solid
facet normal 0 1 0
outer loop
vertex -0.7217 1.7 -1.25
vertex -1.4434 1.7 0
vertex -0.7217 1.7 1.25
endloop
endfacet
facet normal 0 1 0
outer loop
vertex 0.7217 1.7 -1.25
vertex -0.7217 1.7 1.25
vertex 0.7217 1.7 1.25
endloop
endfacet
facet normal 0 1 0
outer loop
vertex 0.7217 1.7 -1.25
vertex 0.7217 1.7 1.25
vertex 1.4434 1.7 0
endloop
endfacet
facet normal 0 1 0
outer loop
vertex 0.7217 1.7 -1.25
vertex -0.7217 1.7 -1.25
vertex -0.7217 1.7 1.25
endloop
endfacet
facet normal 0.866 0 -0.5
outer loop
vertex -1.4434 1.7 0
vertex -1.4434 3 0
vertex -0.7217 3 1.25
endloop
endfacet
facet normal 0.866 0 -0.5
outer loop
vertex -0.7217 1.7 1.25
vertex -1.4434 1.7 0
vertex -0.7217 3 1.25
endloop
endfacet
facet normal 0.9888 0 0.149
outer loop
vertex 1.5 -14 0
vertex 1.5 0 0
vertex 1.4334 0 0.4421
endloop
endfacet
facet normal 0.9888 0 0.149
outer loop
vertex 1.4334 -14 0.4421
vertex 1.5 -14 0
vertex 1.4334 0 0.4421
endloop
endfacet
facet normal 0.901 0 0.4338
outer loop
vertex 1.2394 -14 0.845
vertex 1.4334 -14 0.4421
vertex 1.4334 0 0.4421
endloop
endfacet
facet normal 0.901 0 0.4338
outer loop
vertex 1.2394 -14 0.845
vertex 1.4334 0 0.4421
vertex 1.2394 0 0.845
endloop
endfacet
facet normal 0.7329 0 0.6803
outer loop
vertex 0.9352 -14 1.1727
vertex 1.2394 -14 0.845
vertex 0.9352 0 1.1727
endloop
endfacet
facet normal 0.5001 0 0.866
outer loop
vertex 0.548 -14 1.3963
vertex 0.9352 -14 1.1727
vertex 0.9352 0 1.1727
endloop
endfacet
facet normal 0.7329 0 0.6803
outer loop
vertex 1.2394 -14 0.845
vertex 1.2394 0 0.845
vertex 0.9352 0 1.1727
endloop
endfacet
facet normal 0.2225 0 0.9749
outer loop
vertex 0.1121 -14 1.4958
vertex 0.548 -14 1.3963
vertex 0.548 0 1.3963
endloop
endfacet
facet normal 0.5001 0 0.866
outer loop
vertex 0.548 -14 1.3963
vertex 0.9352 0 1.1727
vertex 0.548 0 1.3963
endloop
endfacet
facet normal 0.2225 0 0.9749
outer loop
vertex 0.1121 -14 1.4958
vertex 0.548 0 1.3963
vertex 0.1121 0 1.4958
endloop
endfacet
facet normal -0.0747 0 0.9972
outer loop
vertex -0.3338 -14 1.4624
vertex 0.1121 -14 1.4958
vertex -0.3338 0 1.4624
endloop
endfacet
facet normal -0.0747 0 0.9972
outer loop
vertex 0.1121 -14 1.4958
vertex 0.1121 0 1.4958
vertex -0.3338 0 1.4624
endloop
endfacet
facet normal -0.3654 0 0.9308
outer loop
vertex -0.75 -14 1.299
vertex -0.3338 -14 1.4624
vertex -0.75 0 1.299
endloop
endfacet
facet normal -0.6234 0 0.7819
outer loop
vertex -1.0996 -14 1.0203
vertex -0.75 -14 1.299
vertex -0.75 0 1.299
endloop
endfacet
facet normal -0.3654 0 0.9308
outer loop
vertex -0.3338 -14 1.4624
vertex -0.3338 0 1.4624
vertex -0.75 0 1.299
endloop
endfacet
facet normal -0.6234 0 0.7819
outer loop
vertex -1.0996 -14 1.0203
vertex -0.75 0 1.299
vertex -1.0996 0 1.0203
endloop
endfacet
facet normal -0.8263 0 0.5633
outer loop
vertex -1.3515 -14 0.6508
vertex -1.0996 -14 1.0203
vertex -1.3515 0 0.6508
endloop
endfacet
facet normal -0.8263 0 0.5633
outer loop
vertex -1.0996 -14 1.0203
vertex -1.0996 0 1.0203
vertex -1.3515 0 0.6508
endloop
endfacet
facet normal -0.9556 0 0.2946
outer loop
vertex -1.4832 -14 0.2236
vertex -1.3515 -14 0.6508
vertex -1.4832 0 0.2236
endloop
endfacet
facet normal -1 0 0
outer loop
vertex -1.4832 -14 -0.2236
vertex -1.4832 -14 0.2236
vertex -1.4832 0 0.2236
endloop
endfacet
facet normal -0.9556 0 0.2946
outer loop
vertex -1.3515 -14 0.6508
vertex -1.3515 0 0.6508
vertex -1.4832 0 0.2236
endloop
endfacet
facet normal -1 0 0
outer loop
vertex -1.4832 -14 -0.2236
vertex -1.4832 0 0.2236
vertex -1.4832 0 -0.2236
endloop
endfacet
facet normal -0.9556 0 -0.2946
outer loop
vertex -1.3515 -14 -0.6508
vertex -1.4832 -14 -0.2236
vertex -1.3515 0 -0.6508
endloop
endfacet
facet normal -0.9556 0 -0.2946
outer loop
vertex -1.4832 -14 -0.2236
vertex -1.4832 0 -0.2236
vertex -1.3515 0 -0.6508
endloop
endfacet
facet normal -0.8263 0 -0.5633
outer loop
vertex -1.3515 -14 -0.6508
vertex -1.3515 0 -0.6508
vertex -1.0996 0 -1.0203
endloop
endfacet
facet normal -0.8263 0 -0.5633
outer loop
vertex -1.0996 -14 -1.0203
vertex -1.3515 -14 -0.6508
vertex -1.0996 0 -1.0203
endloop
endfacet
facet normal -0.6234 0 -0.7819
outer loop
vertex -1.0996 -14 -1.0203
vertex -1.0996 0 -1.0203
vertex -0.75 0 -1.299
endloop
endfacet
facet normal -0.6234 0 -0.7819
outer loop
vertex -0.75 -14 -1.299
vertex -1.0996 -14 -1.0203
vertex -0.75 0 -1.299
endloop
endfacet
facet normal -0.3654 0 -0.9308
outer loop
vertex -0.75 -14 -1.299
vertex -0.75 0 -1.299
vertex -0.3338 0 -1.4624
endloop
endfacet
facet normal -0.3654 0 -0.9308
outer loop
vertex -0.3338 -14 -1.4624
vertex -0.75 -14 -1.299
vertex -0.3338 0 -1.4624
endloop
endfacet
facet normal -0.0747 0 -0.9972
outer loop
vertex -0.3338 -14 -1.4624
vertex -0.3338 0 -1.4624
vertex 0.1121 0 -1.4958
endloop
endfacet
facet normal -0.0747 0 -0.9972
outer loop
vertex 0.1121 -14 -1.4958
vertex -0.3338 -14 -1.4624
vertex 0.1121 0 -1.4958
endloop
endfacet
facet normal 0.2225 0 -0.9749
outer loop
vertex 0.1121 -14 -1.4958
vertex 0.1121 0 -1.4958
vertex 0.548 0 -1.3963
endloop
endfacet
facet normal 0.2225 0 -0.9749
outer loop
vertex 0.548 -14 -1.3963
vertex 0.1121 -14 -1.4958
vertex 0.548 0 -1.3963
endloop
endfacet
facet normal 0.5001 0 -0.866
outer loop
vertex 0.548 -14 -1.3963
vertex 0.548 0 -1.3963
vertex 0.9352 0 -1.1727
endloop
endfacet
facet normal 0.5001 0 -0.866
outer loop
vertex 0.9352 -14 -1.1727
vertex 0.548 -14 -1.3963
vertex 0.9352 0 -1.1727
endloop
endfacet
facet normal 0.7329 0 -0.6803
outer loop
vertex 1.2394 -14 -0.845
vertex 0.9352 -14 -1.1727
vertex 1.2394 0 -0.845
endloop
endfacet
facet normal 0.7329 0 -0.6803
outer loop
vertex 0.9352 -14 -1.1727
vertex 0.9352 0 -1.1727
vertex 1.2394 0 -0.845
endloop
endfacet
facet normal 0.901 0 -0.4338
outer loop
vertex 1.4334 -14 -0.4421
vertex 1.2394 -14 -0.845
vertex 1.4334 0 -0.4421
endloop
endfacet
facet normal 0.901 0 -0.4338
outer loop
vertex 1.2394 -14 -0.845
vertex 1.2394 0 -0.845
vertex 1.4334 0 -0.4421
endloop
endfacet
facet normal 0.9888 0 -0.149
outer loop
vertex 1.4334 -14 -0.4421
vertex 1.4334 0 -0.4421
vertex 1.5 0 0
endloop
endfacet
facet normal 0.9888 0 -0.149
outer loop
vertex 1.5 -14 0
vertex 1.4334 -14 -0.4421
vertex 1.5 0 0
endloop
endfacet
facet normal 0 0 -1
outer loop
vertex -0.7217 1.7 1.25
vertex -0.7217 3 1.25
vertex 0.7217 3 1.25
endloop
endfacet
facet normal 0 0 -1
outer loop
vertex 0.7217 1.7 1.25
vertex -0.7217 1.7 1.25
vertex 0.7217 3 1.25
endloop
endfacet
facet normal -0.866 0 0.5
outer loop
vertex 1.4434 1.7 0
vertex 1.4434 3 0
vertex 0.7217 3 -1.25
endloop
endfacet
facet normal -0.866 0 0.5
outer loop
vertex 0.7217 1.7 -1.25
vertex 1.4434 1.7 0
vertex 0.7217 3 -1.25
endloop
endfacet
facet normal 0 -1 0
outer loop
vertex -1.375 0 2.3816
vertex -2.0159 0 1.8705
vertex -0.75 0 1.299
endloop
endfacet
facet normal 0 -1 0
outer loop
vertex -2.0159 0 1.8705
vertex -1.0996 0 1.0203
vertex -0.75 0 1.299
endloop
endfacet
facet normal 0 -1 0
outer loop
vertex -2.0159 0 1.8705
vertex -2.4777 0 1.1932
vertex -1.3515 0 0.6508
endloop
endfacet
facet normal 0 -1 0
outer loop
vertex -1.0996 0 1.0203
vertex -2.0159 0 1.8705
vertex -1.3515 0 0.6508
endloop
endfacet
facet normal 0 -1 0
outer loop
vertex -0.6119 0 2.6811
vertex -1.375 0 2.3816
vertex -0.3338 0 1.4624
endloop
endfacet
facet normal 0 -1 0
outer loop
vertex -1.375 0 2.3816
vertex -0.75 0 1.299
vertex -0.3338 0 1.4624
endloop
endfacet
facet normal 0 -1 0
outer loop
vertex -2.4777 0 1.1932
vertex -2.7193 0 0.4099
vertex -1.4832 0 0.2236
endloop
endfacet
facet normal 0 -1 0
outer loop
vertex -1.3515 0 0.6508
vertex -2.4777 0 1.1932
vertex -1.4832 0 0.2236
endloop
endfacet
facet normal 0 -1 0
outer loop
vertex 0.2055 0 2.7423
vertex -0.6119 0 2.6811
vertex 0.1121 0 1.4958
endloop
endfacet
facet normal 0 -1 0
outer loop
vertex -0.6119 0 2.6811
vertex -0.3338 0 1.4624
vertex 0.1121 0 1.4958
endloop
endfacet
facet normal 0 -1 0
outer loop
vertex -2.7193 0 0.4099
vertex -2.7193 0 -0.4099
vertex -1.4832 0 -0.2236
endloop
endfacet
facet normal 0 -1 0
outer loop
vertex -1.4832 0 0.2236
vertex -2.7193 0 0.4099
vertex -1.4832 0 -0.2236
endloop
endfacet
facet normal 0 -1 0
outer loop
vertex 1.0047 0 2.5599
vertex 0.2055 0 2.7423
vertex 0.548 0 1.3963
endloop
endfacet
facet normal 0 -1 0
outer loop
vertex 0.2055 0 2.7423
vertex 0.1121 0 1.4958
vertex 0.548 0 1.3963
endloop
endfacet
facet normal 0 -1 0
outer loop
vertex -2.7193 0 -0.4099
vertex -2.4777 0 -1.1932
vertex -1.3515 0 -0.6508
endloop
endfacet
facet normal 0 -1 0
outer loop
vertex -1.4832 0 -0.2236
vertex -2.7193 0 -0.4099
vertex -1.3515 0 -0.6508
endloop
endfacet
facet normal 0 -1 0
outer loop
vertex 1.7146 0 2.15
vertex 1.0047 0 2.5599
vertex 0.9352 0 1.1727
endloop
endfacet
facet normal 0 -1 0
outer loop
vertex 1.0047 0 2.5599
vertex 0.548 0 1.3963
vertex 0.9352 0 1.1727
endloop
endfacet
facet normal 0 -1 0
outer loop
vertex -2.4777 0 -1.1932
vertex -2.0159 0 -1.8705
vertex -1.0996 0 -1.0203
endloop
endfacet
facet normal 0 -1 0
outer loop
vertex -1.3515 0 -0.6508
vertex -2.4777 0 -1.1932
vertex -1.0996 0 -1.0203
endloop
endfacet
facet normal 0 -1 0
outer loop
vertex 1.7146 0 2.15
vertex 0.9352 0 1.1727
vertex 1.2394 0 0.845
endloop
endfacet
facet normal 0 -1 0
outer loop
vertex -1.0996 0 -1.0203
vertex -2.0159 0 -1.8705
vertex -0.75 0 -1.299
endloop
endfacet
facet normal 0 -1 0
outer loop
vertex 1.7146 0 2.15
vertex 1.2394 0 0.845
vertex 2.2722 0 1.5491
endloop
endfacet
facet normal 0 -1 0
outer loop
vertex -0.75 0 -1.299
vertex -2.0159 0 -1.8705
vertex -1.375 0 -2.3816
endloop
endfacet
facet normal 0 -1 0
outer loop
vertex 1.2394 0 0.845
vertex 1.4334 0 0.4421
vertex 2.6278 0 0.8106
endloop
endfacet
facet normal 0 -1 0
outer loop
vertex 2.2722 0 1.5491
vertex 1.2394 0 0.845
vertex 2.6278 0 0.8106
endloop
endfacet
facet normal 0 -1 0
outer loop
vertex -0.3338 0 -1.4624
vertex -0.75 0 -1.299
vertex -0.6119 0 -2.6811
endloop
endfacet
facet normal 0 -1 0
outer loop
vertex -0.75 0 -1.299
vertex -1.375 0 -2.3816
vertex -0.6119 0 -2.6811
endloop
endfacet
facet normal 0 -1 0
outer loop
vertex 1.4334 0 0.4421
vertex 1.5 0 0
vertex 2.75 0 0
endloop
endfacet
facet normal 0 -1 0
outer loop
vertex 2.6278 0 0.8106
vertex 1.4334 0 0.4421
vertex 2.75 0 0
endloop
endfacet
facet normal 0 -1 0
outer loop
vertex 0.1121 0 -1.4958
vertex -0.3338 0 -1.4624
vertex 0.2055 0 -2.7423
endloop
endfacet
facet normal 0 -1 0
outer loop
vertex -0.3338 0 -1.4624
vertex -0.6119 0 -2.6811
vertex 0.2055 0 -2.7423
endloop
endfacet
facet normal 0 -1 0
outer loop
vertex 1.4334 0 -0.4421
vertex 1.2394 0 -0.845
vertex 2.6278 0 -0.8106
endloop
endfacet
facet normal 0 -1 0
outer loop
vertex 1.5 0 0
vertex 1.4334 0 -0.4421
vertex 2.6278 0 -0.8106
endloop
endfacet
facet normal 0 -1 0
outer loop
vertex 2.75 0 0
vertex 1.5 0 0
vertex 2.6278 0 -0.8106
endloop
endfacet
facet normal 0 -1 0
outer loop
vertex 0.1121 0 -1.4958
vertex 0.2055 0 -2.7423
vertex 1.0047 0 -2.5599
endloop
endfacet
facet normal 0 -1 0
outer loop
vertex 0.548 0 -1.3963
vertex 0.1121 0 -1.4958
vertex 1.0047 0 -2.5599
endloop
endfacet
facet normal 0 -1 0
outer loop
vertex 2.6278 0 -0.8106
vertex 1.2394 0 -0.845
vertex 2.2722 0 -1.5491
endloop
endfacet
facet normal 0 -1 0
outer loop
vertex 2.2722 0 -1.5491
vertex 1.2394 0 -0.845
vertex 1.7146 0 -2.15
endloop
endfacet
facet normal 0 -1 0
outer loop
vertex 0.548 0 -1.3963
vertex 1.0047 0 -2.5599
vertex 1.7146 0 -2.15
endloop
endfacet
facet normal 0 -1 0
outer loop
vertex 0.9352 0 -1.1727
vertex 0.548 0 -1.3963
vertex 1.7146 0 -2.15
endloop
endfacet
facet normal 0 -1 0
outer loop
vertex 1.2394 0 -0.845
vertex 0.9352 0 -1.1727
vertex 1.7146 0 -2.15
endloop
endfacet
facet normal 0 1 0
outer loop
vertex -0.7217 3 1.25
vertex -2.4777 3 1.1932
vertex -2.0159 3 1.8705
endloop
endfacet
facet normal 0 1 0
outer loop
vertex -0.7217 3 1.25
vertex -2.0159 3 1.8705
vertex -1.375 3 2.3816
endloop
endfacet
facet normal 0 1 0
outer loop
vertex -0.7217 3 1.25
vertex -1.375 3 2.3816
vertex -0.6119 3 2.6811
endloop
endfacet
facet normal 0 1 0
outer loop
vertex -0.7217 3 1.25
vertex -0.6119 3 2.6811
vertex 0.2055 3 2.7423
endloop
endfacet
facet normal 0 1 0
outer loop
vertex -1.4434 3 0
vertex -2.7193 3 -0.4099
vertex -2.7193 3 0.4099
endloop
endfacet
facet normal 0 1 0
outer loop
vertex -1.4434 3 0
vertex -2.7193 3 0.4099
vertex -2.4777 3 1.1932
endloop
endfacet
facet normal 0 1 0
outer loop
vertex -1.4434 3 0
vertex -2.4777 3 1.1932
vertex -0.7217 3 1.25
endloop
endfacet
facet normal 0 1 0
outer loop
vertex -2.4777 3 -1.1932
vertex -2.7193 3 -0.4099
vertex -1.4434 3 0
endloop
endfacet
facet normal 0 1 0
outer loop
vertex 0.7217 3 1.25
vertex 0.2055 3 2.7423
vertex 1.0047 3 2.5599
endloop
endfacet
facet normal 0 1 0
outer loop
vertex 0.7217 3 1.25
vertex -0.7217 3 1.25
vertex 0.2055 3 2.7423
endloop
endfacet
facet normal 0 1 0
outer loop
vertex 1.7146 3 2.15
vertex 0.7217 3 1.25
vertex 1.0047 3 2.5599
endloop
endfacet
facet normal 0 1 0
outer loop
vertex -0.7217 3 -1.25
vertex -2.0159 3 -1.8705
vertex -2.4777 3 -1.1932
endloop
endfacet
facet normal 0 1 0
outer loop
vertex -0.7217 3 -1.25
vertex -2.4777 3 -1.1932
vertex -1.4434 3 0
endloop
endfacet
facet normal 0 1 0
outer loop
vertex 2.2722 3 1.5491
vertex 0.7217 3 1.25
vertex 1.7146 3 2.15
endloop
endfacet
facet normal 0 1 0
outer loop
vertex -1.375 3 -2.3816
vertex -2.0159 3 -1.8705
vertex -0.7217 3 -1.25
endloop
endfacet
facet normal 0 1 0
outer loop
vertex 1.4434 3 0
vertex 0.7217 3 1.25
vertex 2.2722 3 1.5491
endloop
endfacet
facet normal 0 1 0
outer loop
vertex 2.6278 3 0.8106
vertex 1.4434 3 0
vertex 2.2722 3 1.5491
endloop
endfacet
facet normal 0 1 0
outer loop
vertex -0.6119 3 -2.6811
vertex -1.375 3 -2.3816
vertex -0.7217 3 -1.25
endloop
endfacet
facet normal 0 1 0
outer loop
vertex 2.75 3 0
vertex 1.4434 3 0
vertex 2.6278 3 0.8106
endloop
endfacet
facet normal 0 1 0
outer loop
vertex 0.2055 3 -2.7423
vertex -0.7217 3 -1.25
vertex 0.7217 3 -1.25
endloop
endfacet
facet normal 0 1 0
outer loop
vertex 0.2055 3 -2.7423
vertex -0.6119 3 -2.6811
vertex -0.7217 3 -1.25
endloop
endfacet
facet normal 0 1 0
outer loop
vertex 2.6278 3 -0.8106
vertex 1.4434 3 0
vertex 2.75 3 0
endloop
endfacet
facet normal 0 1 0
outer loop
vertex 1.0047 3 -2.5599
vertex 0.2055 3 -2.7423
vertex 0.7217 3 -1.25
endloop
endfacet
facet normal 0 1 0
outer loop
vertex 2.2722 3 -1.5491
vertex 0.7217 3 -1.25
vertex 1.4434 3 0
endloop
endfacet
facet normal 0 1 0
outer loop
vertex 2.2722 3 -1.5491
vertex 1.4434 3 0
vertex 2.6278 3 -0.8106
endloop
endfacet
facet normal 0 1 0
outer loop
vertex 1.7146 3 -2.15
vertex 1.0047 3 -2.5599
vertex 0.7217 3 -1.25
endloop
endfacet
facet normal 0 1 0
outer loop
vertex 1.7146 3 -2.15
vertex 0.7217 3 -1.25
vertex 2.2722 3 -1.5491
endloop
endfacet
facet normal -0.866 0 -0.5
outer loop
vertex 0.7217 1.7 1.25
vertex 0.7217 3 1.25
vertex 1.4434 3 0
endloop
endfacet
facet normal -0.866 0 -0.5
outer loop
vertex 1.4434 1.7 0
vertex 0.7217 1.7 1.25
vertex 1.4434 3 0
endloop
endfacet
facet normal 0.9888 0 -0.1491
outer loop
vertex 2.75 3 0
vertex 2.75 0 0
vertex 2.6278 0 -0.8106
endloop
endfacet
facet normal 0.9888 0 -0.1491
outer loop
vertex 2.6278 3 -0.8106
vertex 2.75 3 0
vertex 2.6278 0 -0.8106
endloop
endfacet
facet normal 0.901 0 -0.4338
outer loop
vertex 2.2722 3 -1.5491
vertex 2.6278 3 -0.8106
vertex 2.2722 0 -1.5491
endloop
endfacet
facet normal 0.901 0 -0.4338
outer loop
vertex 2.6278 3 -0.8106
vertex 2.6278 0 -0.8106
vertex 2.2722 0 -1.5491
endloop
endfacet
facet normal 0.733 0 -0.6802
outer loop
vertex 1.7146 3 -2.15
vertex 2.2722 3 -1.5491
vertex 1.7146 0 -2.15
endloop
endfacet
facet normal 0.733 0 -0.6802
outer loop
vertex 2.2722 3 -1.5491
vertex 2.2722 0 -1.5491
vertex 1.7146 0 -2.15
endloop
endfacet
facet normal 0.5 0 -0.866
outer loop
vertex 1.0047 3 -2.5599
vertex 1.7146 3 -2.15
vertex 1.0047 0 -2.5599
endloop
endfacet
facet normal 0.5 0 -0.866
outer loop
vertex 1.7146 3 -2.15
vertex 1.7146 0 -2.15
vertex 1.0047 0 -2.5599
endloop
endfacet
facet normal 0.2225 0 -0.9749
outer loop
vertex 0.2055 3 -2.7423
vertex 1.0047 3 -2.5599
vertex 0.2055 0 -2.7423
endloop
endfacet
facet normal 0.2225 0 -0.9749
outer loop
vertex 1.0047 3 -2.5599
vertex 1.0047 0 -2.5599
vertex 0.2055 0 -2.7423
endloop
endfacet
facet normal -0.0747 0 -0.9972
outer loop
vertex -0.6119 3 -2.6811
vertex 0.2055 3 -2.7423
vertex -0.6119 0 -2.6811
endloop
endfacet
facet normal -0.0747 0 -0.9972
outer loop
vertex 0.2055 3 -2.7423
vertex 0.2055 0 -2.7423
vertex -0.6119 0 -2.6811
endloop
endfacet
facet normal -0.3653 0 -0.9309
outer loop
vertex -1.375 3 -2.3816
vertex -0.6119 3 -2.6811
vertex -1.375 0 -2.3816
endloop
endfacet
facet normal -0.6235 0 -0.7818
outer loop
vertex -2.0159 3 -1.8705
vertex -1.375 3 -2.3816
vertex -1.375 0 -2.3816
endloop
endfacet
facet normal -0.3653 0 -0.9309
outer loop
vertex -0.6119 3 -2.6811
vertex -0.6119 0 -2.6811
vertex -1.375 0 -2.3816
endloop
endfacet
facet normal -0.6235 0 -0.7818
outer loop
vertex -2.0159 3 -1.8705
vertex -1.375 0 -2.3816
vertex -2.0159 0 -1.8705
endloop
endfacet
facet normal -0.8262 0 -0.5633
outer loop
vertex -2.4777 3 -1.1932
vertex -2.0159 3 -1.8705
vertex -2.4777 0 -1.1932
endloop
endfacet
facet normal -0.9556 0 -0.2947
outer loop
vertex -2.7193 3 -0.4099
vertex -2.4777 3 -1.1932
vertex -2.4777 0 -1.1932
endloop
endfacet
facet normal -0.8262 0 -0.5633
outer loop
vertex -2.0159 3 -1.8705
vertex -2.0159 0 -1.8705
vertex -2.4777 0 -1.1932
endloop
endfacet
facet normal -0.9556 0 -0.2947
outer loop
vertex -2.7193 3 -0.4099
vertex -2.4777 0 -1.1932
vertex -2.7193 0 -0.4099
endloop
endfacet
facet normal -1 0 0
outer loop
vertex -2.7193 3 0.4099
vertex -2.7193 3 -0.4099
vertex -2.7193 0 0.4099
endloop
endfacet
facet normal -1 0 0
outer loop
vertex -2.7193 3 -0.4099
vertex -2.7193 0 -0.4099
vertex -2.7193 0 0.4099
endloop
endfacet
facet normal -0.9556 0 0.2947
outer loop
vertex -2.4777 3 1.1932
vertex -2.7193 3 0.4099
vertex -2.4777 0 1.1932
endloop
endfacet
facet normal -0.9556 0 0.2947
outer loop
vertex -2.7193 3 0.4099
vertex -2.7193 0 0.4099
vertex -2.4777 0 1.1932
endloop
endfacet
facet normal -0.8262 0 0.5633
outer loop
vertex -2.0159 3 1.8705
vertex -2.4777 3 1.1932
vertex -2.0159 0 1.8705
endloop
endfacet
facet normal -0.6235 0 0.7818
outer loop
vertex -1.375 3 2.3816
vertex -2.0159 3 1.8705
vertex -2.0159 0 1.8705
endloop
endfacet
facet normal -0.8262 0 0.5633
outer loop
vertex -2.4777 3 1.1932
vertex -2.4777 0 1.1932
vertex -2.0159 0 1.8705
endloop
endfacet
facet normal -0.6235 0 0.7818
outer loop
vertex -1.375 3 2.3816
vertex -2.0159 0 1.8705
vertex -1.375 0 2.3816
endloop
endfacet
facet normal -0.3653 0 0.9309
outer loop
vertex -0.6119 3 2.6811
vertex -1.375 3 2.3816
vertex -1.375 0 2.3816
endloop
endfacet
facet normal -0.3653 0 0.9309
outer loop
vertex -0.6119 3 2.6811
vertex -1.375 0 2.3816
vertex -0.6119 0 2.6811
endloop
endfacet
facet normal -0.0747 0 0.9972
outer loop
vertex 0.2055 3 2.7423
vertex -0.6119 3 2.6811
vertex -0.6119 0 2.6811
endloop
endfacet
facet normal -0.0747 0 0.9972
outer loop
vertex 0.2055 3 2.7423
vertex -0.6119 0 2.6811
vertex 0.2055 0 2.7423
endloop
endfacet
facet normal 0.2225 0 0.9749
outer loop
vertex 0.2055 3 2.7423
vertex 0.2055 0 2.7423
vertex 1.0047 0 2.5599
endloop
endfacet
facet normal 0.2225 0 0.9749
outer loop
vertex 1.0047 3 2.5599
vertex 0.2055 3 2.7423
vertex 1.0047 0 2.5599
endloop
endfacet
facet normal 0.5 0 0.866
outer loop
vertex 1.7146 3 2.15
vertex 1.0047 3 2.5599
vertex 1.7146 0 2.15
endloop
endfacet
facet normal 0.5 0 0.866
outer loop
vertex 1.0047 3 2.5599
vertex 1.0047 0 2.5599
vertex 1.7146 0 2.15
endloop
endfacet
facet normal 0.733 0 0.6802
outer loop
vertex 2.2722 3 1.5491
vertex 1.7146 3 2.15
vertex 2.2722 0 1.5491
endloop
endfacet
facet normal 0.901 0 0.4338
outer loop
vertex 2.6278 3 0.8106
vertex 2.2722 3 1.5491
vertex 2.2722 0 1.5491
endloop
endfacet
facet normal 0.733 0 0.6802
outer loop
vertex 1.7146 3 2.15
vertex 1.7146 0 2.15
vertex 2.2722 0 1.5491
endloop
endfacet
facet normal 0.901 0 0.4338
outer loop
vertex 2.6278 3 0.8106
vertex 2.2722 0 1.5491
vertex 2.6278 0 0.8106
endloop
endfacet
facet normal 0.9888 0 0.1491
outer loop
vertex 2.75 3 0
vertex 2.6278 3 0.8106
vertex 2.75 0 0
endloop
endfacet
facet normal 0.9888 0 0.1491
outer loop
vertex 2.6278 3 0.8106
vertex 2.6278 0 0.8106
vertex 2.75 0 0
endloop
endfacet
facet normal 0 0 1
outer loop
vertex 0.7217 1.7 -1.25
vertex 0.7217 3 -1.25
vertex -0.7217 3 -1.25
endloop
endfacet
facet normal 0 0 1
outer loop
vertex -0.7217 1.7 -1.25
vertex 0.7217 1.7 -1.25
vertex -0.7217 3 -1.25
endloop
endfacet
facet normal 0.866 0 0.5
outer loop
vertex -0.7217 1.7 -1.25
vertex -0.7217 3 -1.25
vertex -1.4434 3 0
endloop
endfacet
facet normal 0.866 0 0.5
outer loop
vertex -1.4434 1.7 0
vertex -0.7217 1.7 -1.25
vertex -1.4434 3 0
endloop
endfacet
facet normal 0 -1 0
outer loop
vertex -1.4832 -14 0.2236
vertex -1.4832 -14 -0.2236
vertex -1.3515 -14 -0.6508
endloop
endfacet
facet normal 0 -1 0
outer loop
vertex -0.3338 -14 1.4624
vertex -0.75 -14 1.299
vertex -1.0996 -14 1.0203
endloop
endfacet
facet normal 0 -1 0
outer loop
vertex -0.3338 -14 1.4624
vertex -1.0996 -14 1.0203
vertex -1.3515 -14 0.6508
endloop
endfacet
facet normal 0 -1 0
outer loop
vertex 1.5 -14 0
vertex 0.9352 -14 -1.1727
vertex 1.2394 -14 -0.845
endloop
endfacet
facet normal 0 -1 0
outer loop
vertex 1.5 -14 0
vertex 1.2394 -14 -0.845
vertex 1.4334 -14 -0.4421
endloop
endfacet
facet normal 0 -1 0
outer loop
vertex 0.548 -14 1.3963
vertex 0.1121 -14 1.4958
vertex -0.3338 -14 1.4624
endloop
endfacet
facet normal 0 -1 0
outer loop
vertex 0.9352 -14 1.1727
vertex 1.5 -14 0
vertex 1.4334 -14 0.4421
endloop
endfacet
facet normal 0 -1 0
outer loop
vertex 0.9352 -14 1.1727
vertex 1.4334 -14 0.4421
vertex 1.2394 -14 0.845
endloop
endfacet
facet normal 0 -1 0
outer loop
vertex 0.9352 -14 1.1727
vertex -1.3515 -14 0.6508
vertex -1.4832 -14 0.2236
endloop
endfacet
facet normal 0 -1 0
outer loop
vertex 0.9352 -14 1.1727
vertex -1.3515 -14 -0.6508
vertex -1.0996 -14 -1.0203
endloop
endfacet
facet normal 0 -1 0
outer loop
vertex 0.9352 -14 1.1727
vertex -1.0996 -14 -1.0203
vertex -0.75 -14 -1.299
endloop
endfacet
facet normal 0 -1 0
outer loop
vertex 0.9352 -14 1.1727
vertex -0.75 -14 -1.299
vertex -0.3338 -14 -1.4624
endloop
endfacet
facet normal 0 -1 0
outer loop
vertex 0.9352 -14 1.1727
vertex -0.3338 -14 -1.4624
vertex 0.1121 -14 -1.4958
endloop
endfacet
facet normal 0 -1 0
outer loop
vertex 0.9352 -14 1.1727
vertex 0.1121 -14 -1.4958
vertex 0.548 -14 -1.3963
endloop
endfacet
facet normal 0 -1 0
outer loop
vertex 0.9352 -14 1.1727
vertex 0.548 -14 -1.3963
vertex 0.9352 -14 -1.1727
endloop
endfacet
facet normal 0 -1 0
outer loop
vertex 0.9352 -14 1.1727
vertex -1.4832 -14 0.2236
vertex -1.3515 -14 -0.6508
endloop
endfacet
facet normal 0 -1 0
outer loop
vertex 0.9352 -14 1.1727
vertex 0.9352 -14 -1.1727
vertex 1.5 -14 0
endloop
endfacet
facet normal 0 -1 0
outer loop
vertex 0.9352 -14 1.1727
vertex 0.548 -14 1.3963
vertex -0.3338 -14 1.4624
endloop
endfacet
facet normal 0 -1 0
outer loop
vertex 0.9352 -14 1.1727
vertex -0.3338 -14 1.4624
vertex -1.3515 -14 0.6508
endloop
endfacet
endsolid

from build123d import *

# Parameters (mm, degrees)
SKETCH_1_R            = 2.75
EXTRUDE_248_DEPTH     = 3
CUT_EXTRUDE_378_DEPTH = 1.3
SKETCH_3_R            = 1.5
EXTRUDE_479_DEPTH     = 14


with BuildPart() as part:
    # 草图1 → Extrude 248 (new body)
    with BuildSketch(Plane(origin=(0, 0, 0), x_dir=(1, 0, 0), z_dir=(0, 1, 0))):
        Circle(SKETCH_1_R)
    extrude(amount=EXTRUDE_248_DEPTH)

    # 草图2 → Cut-Extrude 378 (cut)
    with BuildSketch(Plane(origin=(0, 3, 0), x_dir=(1, 0, 0), z_dir=(0, 1, 0))):
        Polygon((1.443375673, 0), (0.721687836, 1.25), (-0.721687836, 1.25), (-1.443375673, 0), (-0.721687836, -1.25), (0.721687836, -1.25), align=None)
    extrude(amount=-CUT_EXTRUDE_378_DEPTH, mode=Mode.SUBTRACT)

    # 草图3 → Extrude 479 (add)
    with BuildSketch(Plane.XZ):
        Circle(SKETCH_3_R)
    extrude(amount=EXTRUDE_479_DEPTH)


solid = part.part
